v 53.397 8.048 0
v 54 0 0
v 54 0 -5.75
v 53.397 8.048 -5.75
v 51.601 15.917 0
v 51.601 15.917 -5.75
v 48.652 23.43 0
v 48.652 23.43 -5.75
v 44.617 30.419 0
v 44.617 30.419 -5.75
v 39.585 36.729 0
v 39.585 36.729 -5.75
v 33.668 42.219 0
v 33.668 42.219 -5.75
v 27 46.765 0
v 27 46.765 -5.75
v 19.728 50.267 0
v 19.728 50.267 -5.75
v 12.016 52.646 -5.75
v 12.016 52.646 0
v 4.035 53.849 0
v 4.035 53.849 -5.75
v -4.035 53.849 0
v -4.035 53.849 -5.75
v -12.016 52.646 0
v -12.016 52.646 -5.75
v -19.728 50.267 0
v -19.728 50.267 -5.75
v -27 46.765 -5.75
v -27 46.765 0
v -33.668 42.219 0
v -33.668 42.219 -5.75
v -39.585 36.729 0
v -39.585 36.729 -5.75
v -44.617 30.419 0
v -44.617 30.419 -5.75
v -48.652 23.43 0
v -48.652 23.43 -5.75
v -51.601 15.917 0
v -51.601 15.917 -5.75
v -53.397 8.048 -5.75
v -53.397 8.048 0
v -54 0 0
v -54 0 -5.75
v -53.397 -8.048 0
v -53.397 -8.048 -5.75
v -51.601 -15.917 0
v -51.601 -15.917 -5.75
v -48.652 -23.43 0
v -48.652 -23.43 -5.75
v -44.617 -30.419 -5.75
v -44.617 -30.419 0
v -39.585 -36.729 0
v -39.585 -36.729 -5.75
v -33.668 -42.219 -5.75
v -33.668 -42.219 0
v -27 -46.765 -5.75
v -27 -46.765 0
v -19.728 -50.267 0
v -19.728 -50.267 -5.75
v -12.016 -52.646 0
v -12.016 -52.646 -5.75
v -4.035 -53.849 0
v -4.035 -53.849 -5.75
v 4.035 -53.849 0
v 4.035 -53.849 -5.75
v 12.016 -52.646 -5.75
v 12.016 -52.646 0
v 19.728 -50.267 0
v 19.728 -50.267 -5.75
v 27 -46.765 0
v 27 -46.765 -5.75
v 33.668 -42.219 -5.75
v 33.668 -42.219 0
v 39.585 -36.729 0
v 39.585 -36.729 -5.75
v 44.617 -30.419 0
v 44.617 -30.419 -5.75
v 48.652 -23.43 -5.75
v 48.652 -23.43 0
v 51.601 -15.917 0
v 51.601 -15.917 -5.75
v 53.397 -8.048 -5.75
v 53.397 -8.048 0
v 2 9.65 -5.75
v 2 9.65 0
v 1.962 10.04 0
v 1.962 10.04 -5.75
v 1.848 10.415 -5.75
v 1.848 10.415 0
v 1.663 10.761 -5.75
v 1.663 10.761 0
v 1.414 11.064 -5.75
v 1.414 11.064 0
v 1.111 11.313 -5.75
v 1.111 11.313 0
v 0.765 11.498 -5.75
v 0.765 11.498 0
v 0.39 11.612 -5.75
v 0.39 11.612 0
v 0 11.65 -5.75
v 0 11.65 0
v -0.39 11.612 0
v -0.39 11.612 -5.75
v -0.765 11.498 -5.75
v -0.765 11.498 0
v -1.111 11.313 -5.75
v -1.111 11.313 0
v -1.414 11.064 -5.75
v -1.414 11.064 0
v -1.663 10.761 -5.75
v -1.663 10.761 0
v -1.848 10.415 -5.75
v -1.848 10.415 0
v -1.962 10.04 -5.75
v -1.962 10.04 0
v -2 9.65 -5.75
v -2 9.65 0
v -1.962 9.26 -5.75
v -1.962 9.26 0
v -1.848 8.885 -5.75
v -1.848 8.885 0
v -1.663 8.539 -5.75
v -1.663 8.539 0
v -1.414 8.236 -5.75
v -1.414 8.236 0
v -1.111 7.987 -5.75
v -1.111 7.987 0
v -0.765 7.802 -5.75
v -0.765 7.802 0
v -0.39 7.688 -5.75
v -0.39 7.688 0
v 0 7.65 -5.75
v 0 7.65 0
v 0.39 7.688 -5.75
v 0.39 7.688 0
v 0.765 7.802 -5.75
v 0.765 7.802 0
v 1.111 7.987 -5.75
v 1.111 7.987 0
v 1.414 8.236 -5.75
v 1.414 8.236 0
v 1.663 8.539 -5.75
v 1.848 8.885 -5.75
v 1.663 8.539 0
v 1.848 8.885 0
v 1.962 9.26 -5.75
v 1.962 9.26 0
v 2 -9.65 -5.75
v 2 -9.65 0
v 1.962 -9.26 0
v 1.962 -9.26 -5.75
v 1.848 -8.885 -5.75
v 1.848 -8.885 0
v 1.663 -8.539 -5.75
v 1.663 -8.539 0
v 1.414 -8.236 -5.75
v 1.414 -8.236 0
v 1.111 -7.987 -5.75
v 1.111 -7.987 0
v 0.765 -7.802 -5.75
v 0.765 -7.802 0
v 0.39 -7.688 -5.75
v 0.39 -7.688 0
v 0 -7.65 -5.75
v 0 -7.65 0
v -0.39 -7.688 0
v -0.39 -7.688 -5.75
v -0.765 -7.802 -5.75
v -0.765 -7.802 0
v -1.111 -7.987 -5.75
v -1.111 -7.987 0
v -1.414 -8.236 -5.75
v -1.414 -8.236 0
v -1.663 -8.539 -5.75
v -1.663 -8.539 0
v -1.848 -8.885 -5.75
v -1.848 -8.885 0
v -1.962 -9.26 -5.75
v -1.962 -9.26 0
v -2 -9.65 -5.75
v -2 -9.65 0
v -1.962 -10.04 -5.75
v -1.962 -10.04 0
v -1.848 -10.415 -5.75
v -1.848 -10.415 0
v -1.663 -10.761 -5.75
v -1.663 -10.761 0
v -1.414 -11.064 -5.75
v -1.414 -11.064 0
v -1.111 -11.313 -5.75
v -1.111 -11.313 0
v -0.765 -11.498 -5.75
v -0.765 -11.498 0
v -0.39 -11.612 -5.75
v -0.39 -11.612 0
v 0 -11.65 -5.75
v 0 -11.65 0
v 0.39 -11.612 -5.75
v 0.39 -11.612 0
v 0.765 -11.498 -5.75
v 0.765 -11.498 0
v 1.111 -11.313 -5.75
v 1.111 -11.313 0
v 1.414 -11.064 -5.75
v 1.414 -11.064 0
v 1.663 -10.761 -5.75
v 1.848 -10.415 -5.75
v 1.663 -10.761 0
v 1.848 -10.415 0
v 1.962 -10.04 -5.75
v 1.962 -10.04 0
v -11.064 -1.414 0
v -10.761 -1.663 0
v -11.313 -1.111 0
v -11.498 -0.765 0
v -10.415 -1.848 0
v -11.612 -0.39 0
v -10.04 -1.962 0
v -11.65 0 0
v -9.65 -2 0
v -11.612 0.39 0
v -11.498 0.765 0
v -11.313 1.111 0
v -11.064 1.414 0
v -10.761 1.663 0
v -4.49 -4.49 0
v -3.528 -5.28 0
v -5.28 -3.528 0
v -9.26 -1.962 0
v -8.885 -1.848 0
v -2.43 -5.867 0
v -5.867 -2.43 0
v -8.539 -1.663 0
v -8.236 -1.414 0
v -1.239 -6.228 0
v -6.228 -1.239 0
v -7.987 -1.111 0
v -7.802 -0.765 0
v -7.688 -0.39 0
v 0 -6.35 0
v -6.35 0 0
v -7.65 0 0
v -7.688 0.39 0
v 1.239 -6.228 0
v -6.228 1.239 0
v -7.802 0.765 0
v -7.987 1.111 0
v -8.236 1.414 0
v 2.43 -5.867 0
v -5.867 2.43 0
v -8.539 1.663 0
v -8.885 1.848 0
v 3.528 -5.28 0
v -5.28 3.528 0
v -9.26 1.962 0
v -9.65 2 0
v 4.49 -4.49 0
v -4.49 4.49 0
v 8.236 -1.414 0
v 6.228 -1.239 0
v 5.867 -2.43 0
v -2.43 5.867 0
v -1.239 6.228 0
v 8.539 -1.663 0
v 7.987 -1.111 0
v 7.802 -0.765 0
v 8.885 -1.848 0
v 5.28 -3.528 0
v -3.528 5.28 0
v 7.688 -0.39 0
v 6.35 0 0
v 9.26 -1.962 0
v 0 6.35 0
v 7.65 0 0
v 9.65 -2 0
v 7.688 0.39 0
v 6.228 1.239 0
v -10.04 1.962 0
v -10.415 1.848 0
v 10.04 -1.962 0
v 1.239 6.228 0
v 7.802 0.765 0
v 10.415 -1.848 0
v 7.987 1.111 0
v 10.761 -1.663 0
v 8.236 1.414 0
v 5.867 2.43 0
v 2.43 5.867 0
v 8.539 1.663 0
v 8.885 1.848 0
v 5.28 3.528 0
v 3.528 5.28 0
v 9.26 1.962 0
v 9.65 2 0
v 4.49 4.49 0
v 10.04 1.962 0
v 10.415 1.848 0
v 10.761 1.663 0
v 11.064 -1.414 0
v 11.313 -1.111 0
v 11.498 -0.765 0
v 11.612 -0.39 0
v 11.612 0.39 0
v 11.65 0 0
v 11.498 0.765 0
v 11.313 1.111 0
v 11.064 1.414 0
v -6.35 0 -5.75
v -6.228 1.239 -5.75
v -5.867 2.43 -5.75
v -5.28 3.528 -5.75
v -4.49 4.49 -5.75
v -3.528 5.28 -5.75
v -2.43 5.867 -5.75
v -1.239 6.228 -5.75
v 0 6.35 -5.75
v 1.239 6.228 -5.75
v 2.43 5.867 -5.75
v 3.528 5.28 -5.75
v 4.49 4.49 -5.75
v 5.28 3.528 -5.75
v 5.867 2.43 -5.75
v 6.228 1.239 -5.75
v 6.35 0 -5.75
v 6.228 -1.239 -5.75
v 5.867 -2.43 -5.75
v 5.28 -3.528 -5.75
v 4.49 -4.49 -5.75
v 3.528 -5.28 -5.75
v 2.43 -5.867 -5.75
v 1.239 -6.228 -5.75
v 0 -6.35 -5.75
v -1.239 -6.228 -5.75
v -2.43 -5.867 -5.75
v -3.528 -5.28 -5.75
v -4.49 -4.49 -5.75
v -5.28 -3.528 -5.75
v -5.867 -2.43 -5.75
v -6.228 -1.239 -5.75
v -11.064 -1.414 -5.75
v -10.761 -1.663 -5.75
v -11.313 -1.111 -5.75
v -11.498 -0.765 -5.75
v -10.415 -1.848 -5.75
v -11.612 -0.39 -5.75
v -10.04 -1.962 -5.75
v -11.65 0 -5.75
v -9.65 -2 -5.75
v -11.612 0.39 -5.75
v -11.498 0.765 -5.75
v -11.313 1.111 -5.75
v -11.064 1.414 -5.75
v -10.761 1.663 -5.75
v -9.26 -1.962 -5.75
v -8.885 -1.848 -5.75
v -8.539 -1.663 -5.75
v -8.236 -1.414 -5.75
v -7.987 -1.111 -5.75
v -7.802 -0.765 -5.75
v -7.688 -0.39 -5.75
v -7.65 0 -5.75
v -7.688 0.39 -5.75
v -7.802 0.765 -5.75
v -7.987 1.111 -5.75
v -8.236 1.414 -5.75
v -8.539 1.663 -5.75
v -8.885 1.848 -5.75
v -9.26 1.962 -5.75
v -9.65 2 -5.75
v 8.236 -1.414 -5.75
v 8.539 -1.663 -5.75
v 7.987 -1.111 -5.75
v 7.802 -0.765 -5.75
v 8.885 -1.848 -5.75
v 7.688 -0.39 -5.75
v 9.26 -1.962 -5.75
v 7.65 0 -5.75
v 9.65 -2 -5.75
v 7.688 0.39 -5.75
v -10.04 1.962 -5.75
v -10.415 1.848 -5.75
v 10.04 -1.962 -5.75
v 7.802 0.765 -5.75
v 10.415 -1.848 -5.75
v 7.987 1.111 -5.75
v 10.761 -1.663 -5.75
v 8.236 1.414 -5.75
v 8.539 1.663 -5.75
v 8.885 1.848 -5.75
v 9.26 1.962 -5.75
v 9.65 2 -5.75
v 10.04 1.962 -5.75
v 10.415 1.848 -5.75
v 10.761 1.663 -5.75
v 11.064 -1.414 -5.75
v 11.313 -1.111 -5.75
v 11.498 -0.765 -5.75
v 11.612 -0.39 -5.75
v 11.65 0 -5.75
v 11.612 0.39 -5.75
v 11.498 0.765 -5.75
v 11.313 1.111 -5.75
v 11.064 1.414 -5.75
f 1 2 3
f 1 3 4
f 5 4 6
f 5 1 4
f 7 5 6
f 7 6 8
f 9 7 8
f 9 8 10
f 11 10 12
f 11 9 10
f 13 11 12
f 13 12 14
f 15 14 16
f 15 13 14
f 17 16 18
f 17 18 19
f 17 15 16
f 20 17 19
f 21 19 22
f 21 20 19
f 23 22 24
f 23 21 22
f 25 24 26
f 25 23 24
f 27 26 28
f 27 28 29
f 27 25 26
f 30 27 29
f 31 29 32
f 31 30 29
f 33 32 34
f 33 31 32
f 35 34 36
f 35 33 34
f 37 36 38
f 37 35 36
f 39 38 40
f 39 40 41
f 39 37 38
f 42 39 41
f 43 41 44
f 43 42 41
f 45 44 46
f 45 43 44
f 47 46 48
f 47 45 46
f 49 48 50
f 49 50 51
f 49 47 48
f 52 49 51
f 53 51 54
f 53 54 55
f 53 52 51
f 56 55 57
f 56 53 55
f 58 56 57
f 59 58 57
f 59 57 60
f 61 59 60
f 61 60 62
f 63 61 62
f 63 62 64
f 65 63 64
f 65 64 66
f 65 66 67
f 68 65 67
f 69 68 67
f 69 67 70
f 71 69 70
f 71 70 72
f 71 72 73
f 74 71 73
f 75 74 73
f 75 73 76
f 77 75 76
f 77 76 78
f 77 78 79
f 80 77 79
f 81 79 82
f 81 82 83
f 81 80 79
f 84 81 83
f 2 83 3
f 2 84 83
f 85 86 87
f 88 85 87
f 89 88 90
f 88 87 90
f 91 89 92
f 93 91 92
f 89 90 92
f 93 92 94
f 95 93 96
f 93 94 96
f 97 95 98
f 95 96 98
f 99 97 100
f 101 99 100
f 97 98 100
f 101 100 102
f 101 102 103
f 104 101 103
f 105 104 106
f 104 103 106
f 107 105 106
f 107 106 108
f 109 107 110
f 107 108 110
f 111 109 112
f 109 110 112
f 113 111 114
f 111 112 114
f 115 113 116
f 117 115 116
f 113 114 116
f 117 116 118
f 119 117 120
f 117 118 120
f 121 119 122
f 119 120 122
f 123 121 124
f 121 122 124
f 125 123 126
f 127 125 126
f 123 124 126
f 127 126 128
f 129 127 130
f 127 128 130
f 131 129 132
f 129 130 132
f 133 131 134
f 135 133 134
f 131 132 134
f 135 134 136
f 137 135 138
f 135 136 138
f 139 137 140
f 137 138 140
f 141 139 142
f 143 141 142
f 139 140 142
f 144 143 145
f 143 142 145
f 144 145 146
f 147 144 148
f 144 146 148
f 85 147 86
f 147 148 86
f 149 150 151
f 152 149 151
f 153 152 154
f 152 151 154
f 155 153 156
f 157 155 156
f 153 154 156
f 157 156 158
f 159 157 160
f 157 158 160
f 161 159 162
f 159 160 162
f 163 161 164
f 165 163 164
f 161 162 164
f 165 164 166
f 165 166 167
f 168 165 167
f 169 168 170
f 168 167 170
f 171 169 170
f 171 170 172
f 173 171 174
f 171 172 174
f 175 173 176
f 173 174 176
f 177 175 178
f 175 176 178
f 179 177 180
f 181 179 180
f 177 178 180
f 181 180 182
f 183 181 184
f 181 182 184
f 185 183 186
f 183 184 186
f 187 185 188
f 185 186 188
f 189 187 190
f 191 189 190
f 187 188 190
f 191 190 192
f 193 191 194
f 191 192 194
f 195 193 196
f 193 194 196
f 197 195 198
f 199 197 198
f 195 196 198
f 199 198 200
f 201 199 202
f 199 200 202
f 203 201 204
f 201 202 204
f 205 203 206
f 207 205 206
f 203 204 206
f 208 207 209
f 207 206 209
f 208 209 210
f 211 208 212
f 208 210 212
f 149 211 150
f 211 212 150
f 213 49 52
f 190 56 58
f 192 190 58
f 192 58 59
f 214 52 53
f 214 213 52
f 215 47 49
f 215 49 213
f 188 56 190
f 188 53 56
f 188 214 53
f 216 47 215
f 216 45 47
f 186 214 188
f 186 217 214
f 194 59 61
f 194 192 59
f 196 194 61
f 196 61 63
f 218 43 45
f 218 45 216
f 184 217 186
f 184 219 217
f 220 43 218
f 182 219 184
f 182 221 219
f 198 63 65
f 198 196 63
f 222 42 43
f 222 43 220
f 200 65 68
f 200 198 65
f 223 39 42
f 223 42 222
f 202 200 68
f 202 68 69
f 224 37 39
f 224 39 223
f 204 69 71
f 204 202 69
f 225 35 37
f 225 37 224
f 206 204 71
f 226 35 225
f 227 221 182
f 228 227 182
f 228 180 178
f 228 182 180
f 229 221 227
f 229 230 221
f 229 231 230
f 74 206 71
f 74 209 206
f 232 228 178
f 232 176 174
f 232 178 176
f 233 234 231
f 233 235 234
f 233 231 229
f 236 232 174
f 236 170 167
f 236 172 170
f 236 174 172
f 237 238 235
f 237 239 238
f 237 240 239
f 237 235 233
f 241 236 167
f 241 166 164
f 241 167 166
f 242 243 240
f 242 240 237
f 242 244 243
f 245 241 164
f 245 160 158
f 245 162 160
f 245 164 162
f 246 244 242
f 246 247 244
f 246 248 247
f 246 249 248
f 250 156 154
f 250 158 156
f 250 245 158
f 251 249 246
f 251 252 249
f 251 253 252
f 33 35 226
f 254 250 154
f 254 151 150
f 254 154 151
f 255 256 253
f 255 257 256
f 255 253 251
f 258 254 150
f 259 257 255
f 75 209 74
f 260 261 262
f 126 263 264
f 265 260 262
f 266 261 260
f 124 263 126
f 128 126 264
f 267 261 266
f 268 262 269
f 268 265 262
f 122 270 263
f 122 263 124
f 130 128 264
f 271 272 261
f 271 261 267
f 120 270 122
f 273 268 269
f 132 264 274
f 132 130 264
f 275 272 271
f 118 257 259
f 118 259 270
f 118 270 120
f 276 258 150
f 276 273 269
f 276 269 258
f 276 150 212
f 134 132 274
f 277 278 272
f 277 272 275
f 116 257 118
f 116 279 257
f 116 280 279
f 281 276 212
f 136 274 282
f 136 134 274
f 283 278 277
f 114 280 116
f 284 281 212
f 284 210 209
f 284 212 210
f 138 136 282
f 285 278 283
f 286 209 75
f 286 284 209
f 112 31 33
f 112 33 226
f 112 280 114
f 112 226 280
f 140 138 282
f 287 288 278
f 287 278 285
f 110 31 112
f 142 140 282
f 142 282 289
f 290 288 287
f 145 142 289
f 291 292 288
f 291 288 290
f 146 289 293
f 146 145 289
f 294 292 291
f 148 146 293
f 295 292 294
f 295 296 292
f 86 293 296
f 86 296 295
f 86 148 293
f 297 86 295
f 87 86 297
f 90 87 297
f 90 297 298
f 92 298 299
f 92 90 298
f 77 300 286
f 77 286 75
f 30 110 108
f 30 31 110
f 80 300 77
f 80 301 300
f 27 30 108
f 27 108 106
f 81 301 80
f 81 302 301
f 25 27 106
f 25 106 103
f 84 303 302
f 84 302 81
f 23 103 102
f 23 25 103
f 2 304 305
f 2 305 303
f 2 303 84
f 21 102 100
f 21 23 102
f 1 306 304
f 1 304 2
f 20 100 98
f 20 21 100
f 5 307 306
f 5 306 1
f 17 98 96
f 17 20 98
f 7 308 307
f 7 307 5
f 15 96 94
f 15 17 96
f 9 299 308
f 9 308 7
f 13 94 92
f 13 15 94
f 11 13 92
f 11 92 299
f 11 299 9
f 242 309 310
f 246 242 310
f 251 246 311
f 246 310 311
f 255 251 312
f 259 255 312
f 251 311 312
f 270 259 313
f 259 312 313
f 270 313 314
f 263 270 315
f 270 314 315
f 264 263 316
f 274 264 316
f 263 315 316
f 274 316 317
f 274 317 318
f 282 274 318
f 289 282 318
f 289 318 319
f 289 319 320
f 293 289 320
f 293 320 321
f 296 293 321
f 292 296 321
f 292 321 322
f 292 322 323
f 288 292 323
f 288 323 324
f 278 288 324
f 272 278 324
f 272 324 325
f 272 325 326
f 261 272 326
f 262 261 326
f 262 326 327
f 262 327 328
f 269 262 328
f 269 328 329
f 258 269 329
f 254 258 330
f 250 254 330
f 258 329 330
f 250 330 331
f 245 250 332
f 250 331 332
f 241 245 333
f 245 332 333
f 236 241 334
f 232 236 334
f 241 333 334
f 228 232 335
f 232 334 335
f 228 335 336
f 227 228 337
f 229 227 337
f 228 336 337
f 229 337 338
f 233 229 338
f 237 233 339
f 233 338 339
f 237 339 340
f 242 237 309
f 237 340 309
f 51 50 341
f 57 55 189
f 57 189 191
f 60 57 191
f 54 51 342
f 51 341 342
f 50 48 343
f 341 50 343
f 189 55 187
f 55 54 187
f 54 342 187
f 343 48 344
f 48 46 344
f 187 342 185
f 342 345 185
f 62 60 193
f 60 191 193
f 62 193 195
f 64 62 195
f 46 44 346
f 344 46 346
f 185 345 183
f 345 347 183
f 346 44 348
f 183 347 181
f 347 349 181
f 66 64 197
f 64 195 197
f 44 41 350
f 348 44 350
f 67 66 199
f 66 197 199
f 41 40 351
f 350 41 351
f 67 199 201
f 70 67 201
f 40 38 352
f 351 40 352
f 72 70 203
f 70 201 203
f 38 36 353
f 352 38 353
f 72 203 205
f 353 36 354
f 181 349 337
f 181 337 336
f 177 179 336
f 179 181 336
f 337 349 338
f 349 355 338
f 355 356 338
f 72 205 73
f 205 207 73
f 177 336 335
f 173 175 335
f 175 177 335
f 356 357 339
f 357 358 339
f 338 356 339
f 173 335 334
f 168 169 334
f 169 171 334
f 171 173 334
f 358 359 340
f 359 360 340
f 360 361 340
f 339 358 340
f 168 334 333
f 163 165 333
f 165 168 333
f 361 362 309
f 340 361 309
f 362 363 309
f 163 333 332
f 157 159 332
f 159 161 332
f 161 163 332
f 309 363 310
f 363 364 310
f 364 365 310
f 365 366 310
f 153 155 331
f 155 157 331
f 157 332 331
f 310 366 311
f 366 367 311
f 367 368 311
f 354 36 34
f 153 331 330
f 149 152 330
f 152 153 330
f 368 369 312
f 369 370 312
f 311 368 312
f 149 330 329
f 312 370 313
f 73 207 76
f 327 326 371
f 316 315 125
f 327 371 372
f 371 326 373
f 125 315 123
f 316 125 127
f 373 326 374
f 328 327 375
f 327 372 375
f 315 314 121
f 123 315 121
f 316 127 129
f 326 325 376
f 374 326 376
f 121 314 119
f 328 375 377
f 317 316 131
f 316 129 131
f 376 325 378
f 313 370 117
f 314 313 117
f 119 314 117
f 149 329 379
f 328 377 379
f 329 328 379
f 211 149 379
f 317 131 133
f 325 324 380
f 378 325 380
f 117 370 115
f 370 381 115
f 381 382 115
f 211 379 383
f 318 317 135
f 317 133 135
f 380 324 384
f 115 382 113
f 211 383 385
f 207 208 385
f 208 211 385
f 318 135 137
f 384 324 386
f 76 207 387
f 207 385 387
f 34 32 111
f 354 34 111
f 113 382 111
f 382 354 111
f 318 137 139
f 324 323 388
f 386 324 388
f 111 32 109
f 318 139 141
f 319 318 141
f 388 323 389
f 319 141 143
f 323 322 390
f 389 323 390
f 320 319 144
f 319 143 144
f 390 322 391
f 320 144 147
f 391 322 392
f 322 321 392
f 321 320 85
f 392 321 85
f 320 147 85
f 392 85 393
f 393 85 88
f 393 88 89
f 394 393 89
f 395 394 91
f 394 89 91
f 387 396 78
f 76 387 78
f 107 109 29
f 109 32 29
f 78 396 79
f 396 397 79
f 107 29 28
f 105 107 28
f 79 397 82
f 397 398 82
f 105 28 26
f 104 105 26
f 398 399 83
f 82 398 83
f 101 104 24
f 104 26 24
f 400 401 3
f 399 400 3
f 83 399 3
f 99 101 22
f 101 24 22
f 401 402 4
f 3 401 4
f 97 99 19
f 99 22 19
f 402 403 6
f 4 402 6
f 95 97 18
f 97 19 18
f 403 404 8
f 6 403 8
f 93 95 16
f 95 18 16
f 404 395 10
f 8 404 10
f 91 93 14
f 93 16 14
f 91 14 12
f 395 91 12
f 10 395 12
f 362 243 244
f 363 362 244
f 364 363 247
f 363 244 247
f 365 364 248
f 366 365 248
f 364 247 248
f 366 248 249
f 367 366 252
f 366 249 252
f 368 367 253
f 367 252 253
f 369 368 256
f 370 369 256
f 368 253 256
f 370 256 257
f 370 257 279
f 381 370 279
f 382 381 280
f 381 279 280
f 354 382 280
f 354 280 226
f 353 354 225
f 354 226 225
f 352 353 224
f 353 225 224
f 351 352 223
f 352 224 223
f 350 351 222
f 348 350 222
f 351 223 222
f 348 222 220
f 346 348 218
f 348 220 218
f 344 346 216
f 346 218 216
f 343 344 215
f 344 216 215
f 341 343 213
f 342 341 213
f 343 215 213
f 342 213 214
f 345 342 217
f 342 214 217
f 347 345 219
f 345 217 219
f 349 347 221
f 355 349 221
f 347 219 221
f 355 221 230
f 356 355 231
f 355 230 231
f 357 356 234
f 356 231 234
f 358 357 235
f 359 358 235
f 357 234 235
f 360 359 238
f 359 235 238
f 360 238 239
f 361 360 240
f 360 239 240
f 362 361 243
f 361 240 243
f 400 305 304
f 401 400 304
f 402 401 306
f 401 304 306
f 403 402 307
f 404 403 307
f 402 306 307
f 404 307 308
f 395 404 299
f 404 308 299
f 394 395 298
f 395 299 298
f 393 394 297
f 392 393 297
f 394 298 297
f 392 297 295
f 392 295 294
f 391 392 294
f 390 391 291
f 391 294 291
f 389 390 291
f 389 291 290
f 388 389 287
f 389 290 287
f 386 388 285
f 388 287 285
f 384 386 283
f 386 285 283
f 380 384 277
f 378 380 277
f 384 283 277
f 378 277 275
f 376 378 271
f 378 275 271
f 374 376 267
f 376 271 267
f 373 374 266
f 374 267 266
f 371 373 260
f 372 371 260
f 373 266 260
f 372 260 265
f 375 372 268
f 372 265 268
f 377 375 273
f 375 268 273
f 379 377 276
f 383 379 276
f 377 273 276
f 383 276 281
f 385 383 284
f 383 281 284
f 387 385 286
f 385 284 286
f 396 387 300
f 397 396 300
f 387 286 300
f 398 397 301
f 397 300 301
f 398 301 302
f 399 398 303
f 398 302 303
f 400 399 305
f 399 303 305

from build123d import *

# Parameters (mm, degrees)
ESQUISSE1_R        = 54
ESQUISSE1_R_2      = 2
ESQUISSE1_R_3      = 3.175
BOSS_EXTRU_1_DEPTH = 5.75
CUT_EXTRUDE1_REACH = 78.584
SKETCH1_R          = 6.35


with BuildPart() as part:
    # Esquisse1 → Boss.-Extru.1 (new body)
    with BuildSketch(Plane.XY):
        Circle(ESQUISSE1_R)
        with Locations((0, -9.65)):
            Circle(ESQUISSE1_R_2, mode=Mode.SUBTRACT)
        with Locations((0, 9.65)):
            Circle(ESQUISSE1_R_2, mode=Mode.SUBTRACT)
        with Locations((-9.65, 0)):
            Circle(ESQUISSE1_R_2, mode=Mode.SUBTRACT)
        with Locations((9.65, 0)):
            Circle(ESQUISSE1_R_2, mode=Mode.SUBTRACT)
        Circle(ESQUISSE1_R_3, mode=Mode.SUBTRACT)
    extrude(amount=-BOSS_EXTRU_1_DEPTH)

    # Sketch1 → Cut-Extrude1 (cut, up to next)
    with BuildSketch(Plane(origin=(0, 0, -5.75), x_dir=(-1, 0, 0), z_dir=(0, 0, -1)), mode=Mode.PRIVATE) as cut_extrude1_sk1:
        Circle(SKETCH1_R)
    cut_extrude1_tool1 = extrude(cut_extrude1_sk1.sketch, amount=-CUT_EXTRUDE1_REACH, mode=Mode.PRIVATE) & part.part
    add(cut_extrude1_tool1.solids().sort_by_distance((0, 0, -5.75))[0], mode=Mode.SUBTRACT)


solid = part.part
